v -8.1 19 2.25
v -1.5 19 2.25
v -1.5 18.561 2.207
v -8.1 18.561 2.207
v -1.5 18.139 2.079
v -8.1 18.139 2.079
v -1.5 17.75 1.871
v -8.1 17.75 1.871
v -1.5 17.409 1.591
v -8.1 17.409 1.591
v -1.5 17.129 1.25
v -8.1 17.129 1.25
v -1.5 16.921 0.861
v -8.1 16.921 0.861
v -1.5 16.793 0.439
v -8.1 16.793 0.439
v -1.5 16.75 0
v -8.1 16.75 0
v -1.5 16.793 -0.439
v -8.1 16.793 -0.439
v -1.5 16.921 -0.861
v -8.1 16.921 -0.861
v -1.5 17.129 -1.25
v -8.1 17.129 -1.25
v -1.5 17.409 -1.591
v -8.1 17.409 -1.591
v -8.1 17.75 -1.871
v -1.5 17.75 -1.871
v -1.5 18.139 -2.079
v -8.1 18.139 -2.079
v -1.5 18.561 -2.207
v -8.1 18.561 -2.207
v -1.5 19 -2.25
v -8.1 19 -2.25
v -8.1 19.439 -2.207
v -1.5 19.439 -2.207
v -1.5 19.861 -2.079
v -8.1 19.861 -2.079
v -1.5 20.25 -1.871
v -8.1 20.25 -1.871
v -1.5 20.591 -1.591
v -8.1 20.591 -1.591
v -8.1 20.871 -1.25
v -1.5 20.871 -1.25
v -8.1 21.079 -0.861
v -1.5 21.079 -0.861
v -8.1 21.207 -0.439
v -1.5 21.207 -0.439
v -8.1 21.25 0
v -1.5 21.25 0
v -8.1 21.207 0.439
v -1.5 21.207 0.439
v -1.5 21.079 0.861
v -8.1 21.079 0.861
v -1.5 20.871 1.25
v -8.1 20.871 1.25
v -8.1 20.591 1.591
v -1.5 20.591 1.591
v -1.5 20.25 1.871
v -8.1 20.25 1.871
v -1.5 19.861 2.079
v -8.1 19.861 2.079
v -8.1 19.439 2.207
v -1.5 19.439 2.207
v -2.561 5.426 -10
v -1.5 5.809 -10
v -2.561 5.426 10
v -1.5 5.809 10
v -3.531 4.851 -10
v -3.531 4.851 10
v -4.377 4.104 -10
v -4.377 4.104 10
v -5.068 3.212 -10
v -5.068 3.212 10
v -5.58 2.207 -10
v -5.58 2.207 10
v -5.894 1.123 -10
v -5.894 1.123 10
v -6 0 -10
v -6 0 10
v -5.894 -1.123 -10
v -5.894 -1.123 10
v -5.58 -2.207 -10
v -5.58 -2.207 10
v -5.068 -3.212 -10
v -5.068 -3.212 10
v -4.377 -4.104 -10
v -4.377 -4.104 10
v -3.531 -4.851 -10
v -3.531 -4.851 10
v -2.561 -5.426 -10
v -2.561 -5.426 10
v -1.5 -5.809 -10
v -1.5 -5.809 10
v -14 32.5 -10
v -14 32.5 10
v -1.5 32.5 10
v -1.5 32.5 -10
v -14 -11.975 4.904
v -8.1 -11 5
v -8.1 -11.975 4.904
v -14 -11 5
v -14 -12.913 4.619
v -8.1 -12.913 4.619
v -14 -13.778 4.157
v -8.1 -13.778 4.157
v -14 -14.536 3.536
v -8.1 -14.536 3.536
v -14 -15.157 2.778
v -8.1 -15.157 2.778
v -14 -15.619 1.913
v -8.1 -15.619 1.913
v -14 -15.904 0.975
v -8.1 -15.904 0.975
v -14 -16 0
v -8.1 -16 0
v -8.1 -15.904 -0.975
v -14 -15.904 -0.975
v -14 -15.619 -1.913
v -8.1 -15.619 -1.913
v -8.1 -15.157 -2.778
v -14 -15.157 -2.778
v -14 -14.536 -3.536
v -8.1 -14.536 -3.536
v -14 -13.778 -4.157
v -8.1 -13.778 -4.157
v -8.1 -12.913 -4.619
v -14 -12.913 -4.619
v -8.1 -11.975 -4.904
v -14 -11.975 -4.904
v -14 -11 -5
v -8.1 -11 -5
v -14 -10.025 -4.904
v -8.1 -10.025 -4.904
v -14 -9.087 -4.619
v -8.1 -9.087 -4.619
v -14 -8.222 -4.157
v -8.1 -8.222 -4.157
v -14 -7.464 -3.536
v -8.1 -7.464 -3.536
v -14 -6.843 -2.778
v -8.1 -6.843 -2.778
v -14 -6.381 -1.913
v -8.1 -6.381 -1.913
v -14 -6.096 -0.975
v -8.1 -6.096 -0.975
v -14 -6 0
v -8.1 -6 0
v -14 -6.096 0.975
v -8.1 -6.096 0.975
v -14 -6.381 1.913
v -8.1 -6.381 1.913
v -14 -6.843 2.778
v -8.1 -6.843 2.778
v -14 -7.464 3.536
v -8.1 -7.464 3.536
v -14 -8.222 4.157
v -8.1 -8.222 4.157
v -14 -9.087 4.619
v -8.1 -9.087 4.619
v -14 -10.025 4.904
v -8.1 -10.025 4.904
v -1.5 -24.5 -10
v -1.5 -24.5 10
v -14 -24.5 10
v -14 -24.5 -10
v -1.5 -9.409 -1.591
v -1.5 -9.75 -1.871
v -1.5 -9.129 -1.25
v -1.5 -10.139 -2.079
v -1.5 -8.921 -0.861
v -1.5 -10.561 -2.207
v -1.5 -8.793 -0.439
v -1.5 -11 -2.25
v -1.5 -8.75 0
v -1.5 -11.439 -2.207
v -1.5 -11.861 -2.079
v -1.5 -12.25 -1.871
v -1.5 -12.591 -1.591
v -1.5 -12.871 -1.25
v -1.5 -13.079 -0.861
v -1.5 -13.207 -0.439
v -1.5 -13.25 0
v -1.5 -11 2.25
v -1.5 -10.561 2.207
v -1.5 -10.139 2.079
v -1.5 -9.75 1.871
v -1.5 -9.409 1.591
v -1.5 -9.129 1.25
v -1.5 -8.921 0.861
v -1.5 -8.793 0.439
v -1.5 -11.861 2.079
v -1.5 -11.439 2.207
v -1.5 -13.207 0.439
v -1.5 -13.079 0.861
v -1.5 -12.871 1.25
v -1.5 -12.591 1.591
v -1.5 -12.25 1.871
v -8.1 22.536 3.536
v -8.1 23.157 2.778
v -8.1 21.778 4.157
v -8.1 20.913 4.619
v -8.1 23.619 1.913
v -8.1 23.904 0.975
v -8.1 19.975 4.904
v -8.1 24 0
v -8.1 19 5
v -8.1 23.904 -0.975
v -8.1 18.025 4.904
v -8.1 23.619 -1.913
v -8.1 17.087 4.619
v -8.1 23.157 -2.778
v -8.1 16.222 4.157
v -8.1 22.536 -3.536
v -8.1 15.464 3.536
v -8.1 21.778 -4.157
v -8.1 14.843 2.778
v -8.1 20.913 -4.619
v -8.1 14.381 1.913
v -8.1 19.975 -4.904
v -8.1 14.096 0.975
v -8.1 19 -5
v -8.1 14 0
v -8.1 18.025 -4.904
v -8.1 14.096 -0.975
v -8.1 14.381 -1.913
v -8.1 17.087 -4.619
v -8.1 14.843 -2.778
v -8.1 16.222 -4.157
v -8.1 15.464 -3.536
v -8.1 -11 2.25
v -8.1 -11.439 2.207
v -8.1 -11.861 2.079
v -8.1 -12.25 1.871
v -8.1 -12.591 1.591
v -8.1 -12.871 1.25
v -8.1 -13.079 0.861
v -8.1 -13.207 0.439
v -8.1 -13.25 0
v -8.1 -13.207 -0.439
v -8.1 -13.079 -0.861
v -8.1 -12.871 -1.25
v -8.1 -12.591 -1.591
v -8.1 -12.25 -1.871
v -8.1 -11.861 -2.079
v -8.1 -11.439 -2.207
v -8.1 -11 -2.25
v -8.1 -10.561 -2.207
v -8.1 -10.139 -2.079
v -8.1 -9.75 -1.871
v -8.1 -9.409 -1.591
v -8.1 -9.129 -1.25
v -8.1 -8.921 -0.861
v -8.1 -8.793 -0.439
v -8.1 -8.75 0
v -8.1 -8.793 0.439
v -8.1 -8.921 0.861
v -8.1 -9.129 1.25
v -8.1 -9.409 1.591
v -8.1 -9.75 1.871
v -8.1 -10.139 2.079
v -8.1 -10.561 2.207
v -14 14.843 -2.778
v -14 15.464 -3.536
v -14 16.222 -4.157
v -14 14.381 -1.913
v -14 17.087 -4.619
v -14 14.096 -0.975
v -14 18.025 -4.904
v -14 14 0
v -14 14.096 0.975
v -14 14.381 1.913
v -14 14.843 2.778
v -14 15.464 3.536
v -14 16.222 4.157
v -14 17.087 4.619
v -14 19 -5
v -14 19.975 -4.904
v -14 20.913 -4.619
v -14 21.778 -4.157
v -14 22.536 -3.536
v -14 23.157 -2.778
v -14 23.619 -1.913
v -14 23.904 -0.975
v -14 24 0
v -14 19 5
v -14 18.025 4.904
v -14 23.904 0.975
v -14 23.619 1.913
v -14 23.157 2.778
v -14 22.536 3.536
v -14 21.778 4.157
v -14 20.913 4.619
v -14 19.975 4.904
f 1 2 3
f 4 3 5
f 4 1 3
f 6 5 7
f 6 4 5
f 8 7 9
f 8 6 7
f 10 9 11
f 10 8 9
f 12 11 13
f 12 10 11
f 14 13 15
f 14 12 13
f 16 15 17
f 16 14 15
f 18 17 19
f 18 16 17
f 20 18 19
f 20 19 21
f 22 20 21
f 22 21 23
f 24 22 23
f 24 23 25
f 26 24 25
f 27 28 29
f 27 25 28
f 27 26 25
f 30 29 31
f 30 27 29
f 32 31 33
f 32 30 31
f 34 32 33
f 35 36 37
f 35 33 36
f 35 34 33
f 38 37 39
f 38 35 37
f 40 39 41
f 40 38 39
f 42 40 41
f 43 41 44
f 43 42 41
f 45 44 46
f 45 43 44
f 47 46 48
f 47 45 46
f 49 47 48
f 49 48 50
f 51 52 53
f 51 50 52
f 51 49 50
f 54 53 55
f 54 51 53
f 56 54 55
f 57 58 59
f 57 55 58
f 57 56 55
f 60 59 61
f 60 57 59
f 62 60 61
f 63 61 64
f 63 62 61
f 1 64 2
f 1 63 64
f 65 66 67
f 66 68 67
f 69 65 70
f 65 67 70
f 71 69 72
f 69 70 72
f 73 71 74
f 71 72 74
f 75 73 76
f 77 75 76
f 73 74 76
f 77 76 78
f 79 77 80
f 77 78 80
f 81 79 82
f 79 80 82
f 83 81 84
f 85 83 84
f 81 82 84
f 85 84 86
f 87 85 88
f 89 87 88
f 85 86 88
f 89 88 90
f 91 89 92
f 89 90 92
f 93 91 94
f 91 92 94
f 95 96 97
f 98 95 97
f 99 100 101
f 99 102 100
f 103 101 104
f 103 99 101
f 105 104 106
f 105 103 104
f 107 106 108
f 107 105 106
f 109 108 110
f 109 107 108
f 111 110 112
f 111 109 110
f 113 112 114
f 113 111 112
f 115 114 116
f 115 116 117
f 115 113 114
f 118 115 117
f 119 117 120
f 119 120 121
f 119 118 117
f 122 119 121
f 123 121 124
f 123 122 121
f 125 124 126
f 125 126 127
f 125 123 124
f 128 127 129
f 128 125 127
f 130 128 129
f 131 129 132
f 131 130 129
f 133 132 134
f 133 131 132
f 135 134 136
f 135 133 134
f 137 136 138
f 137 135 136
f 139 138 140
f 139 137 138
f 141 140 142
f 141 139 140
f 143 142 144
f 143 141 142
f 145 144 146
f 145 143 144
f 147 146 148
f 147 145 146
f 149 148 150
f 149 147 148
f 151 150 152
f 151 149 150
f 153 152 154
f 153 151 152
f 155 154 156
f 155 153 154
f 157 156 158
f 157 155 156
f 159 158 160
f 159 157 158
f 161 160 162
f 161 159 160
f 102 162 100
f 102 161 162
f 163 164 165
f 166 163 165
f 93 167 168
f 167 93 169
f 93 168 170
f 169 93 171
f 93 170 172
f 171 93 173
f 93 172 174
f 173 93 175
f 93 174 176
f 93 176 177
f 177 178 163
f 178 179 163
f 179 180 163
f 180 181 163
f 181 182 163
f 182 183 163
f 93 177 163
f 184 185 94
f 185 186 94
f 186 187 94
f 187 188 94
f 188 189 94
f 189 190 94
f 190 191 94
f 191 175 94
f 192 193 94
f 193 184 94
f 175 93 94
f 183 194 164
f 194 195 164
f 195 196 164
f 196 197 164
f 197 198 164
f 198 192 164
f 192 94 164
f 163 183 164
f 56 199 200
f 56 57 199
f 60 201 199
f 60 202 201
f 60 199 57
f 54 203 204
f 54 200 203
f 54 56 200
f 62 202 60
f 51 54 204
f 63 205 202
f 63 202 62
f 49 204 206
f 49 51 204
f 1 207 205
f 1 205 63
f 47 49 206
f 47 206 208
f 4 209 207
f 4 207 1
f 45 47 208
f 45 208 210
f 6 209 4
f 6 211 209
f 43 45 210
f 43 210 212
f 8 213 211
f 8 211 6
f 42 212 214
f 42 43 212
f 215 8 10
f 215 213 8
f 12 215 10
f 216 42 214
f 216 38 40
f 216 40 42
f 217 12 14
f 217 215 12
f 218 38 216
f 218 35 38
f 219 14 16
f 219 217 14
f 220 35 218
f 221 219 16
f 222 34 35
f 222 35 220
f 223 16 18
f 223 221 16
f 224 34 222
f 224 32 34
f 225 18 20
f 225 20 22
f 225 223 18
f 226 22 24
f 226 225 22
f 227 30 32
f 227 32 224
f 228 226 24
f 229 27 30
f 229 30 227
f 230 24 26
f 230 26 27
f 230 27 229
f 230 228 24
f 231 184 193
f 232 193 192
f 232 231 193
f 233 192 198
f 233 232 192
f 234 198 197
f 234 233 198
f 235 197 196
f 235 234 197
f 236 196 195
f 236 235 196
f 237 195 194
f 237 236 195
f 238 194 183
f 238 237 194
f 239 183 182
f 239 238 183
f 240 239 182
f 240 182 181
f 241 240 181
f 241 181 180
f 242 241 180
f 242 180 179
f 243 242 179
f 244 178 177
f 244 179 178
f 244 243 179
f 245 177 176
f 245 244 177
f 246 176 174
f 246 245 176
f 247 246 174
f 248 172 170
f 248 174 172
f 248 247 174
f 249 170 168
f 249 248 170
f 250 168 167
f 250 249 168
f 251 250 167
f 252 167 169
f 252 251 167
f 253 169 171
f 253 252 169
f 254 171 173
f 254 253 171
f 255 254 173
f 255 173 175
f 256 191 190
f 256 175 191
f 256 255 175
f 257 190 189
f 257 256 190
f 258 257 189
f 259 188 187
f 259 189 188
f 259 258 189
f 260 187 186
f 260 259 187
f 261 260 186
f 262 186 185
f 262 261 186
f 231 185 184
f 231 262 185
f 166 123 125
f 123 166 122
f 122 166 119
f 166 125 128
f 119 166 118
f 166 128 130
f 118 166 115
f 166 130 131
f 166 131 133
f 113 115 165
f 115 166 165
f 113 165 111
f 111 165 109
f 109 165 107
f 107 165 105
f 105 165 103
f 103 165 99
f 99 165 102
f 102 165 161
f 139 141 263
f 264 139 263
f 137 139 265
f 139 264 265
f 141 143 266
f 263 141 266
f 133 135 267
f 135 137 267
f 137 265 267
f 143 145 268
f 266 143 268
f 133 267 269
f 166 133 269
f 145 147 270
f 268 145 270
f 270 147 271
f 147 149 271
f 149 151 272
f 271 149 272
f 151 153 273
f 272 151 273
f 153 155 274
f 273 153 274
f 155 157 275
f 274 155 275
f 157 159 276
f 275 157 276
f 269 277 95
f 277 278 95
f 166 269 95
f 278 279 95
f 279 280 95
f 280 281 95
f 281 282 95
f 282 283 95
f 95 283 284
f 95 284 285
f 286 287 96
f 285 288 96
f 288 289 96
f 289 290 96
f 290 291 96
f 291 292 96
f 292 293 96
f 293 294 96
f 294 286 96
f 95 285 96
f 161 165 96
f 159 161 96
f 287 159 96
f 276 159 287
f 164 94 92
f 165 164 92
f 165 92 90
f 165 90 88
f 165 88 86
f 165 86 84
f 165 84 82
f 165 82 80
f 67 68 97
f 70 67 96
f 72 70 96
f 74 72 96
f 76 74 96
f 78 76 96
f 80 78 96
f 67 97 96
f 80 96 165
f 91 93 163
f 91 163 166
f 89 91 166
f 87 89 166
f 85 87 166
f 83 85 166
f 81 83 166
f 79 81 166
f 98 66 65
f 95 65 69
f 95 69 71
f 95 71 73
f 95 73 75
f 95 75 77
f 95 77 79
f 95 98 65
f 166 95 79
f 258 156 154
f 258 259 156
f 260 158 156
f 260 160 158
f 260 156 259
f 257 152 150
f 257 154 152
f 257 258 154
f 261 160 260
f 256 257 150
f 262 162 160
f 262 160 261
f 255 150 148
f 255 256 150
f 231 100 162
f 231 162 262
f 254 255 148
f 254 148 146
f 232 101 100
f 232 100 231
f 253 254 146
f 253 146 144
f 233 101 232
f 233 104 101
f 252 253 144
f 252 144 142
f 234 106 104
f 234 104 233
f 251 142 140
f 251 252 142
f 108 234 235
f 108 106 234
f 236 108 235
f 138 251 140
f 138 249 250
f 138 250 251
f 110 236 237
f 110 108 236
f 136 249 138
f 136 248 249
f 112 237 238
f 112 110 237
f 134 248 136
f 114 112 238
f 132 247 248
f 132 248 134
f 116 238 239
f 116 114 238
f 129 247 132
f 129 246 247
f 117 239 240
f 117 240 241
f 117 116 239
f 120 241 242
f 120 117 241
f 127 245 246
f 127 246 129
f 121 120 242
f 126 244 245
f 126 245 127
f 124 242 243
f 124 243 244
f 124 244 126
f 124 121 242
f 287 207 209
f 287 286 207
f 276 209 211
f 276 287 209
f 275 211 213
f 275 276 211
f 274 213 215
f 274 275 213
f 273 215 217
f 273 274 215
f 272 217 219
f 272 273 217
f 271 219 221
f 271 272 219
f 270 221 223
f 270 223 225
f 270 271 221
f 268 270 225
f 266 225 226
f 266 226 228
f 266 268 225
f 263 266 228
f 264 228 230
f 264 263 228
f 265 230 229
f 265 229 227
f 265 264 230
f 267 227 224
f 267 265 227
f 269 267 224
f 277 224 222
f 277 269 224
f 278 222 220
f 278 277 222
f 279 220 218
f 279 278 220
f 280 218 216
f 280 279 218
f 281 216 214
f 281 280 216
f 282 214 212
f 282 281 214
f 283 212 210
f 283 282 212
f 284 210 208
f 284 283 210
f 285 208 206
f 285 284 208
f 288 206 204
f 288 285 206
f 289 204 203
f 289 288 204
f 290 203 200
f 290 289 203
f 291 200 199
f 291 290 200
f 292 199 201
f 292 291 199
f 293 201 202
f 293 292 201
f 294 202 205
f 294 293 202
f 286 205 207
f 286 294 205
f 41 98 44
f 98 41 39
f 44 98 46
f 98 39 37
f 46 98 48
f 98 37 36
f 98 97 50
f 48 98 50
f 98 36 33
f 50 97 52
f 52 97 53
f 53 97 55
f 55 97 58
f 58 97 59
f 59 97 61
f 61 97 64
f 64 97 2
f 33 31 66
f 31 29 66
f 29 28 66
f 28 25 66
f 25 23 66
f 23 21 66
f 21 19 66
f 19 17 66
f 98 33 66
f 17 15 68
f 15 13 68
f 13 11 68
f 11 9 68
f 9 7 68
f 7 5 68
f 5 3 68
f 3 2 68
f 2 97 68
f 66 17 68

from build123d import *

# Parameters (mm, degrees)
BOSS_EXTRUDE1_DEPTH                          = 10
BOSS_EXTRUDE1_2_DEPTH                        = 10
CBORE_FOR_M5_HEX_SOCKET_HEAD_CAP_SCR_2_COUNT = 2
CBORE_FOR_M5_HEX_SOCKET_HEAD_CAP_SCR_2_PITCH = 30
BOSS_EXTRUDE2_DEPTH                          = 13
BOSS_EXTRUDE3_DEPTH                          = 23
BOSS_EXTRUDE4_DEPTH                          = 27
SKETCH8_R                                    = 2.1
CUT_EXTRUDE1_DEPTH                           = 52.298148115
CHAMFER1_SIZE                                = 16
CUT_EXTRUDE2_DEPTH                           = 6
SKETCH10_R                                   = 5
SKETCH10_R_2                                 = 2.1
BOSS_EXTRUDE5_DEPTH                          = 0.7
CHAMFER2_SIZE                                = 1


with BuildPart() as part:
    # Sketch1 → Boss-Extrude1 (new, symmetric)
    with BuildSketch(Plane.XY):
        with BuildLine():
            Line((-14, 32.5), (-1.5, 32.5))
            Line((-1.5, 32.5), (-1.5, 5.809475019))
            ThreePointArc((-1.5, 5.809475019), (-6, 0), (-1.5, -5.809475019))
            Line((-1.5, -5.809475019), (-1.5, -24.5))
            Line((-1.5, -24.5), (-14, -24.5))
            Line((-14, -24.5), (-14, 32.5))
        make_face()
    extrude(amount=BOSS_EXTRUDE1_DEPTH, both=True)


with BuildPart() as body_2:
    # Sketch1 → Boss-Extrude1 2 (new, symmetric)
    with BuildSketch(Plane.XY):
        with BuildLine():
            Line((15, 33.5), (15, 23))
            Line((15, 23), (15.6, 23))
            Line((15.6, 23), (15.6, 15))
            Line((15.6, 15), (15, 15))
            Line((15, 15), (15, -7))
            Line((15, -7), (15.6, -7))
            Line((15.6, -7), (15.6, -15))
            Line((15.6, -15), (15, -15))
            Line((15, -15), (15, -25.5))
            Line((15, -25.5), (1.5, -25.5))
            Line((1.5, -25.5), (1.5, -5.809475019))
            ThreePointArc((1.5, -5.809475019), (6, 0), (1.5, 5.809475019))
            Line((1.5, 5.809475019), (1.5, 33.5))
            Line((1.5, 33.5), (15, 33.5))
        make_face()
    extrude(amount=BOSS_EXTRUDE1_2_DEPTH, both=True)


with BuildPart() as cbore_for_m5_hex_socket_head_cap_screw1_tool:
    # Sketch2 → CBORE for M5 Hex Socket Head Cap Screw1 (revolve)
    with BuildSketch(Plane(origin=(-14, -11, 0), x_dir=(0, 0, 1), z_dir=(0, 1, 0))):
        Polygon((0, 0), (0, 29.6), (2.25, 29.6), (2.25, 5.9), (5, 5.9), (5, 0), align=None)
    cbore_for_m5_hex_socket_head_cap_screw1 = revolve(axis=Axis((-20.35, -11, 0), (1, 0, 0)))


with BuildPart() as part_1:
    add(part.part)

    # CBORE for M5 Hex Socket Head Cap Screw1: cut by cbore_for_m5_hex_socket_head_cap_screw1_tool
    add(cbore_for_m5_hex_socket_head_cap_screw1_tool.part, mode=Mode.SUBTRACT)


with BuildPart() as body_2_1:
    add(body_2.part)

    # CBORE for M5 Hex Socket Head Cap Screw1: cut by cbore_for_m5_hex_socket_head_cap_screw1_tool
    add(cbore_for_m5_hex_socket_head_cap_screw1_tool.part, mode=Mode.SUBTRACT)


with BuildPart() as cbore_for_m5_hex_socket_head_cap_scr_2_tool:
    # CBORE for M5 Hex Socket Head Cap Scr 2: CBORE for M5 Hex Socket Head Cap Screw1 ×2
    with Locations(*[(0, i * CBORE_FOR_M5_HEX_SOCKET_HEAD_CAP_SCR_2_PITCH, 0) for i in range(1, CBORE_FOR_M5_HEX_SOCKET_HEAD_CAP_SCR_2_COUNT)]):
        add(cbore_for_m5_hex_socket_head_cap_screw1)


with BuildPart() as part_2:
    add(part_1.part)

    # CBORE for M5 Hex Socket Head Cap Scr 2: cut by cbore_for_m5_hex_socket_head_cap_scr_2_tool
    add(cbore_for_m5_hex_socket_head_cap_scr_2_tool.part, mode=Mode.SUBTRACT)


with BuildPart() as body_2_2:
    add(body_2_1.part)

    # CBORE for M5 Hex Socket Head Cap Scr 2: cut by cbore_for_m5_hex_socket_head_cap_scr_2_tool
    add(cbore_for_m5_hex_socket_head_cap_scr_2_tool.part, mode=Mode.SUBTRACT)

    # Sketch4 → Boss-Extrude2 (add)
    with BuildSketch(Plane.XY.offset(10)):
        Polygon((1.5, 5.809475019), (1.5, -5.809475019), (1.5, -25.5), (15, -25.5), (15, -15), (15.6, -15), (15.6, -7), (15, -7), (15, 15), (15.6, 15), (15.6, 23), (15, 23), (15, 33.5), (1.5, 33.5), align=None)
    extrude(amount=BOSS_EXTRUDE2_DEPTH)

    # Sketch5 → Boss-Extrude3 (add)
    with BuildSketch(Plane(origin=(0, 0, -10), x_dir=(-1, 0, 0), z_dir=(0, 0, -1))):
        with BuildLine():
            Line((-15, -25.5), (-1.5, -25.5))
            Line((-1.5, -25.5), (-1.5, -5.809475019))
            ThreePointArc((-1.5, -5.809475019), (-6, 0), (-1.5, 5.809475019))
            Line((-1.5, 5.809475019), (-1.5, 33.5))
            Line((-1.5, 33.5), (-15, 33.5))
            Line((-15, 33.5), (-15, 23))
            Line((-15, 23), (-15.6, 23))
            Line((-15.6, 23), (-15.6, 15))
            Line((-15.6, 15), (-15, 15))
            Line((-15, 15), (-15, -7))
            Line((-15, -7), (-15.6, -7))
            Line((-15.6, -7), (-15.6, -15))
            Line((-15.6, -15), (-15, -15))
            Line((-15, -15), (-15, -25.5))
        make_face()
    extrude(amount=BOSS_EXTRUDE3_DEPTH)

    # Sketch7 → Boss-Extrude4 (add)
    with BuildSketch(Plane(origin=(0, 33.5, 0), x_dir=(1, 0, 0), z_dir=(0, 1, 0))):
        Polygon((1.5, 33), (-4.9, 33), (-4.9, 17.4), (1.5, 11), align=None)
    extrude(amount=-BOSS_EXTRUDE4_DEPTH)

    # Sketch8 → Cut-Extrude1 (cut, through all)
    with BuildSketch(Plane.ZY.offset(4.9)):
        with Locations((-25, 19)):
            Circle(SKETCH8_R)
    extrude(amount=-CUT_EXTRUDE1_DEPTH, mode=Mode.SUBTRACT)

    # Chamfer1
    chamfer1_edges = [body_2_2.edges().sort_by_distance(p)[0] for p in [
        (8.25, -25.5, -33),
    ]]
    chamfer(chamfer1_edges, length=CHAMFER1_SIZE)

    # Sketch9 → Cut-Extrude2 (cut)
    with BuildSketch(Plane(origin=(15.6, 0, 0), x_dir=(0, 0, -1), z_dir=(1, 0, 0))):
        Polygon((29.099186911, 19), (27.049593456, 22.55), (22.950406544, 22.55), (20.900813089, 19), (22.950406544, 15.45), (27.049593456, 15.45), align=None)
    extrude(amount=-CUT_EXTRUDE2_DEPTH, mode=Mode.SUBTRACT)

    # Sketch10 → Boss-Extrude5 (add)
    with BuildSketch(Plane.ZY.offset(4.9)):
        with Locations((-25, 19)):
            Circle(SKETCH10_R)
        with Locations((-25, 19)):
            Circle(SKETCH10_R_2, mode=Mode.SUBTRACT)
    extrude(amount=BOSS_EXTRUDE5_DEPTH)

    # Chamfer2
    # the kernel refuses this chamfer: 1 mm, written as the material it takes off along each edge
    with BuildSketch(Plane(origin=(-5.6, 19, -25), x_dir=(0, 0, 1), z_dir=(0, -1, 0))) as chamfer2_piece_1_section:
        Polygon((5, -CHAMFER2_SIZE), (5 - CHAMFER2_SIZE, 0), (5, 0), align=None)
    chamfer2_piece_1 = revolve(axis=Axis((-5.6, 19, -25), (-1, 0, 0)), mode=Mode.PRIVATE)
    chamfer2_piece_1 = split(chamfer2_piece_1, bisect_by=Plane(origin=(-4.9, 19, -29.353058273), z_dir=(-1, 0, 0)), keep=Keep.TOP, mode=Mode.PRIVATE)
    add(chamfer2_piece_1, mode=Mode.SUBTRACT)


solid = part_2.part
